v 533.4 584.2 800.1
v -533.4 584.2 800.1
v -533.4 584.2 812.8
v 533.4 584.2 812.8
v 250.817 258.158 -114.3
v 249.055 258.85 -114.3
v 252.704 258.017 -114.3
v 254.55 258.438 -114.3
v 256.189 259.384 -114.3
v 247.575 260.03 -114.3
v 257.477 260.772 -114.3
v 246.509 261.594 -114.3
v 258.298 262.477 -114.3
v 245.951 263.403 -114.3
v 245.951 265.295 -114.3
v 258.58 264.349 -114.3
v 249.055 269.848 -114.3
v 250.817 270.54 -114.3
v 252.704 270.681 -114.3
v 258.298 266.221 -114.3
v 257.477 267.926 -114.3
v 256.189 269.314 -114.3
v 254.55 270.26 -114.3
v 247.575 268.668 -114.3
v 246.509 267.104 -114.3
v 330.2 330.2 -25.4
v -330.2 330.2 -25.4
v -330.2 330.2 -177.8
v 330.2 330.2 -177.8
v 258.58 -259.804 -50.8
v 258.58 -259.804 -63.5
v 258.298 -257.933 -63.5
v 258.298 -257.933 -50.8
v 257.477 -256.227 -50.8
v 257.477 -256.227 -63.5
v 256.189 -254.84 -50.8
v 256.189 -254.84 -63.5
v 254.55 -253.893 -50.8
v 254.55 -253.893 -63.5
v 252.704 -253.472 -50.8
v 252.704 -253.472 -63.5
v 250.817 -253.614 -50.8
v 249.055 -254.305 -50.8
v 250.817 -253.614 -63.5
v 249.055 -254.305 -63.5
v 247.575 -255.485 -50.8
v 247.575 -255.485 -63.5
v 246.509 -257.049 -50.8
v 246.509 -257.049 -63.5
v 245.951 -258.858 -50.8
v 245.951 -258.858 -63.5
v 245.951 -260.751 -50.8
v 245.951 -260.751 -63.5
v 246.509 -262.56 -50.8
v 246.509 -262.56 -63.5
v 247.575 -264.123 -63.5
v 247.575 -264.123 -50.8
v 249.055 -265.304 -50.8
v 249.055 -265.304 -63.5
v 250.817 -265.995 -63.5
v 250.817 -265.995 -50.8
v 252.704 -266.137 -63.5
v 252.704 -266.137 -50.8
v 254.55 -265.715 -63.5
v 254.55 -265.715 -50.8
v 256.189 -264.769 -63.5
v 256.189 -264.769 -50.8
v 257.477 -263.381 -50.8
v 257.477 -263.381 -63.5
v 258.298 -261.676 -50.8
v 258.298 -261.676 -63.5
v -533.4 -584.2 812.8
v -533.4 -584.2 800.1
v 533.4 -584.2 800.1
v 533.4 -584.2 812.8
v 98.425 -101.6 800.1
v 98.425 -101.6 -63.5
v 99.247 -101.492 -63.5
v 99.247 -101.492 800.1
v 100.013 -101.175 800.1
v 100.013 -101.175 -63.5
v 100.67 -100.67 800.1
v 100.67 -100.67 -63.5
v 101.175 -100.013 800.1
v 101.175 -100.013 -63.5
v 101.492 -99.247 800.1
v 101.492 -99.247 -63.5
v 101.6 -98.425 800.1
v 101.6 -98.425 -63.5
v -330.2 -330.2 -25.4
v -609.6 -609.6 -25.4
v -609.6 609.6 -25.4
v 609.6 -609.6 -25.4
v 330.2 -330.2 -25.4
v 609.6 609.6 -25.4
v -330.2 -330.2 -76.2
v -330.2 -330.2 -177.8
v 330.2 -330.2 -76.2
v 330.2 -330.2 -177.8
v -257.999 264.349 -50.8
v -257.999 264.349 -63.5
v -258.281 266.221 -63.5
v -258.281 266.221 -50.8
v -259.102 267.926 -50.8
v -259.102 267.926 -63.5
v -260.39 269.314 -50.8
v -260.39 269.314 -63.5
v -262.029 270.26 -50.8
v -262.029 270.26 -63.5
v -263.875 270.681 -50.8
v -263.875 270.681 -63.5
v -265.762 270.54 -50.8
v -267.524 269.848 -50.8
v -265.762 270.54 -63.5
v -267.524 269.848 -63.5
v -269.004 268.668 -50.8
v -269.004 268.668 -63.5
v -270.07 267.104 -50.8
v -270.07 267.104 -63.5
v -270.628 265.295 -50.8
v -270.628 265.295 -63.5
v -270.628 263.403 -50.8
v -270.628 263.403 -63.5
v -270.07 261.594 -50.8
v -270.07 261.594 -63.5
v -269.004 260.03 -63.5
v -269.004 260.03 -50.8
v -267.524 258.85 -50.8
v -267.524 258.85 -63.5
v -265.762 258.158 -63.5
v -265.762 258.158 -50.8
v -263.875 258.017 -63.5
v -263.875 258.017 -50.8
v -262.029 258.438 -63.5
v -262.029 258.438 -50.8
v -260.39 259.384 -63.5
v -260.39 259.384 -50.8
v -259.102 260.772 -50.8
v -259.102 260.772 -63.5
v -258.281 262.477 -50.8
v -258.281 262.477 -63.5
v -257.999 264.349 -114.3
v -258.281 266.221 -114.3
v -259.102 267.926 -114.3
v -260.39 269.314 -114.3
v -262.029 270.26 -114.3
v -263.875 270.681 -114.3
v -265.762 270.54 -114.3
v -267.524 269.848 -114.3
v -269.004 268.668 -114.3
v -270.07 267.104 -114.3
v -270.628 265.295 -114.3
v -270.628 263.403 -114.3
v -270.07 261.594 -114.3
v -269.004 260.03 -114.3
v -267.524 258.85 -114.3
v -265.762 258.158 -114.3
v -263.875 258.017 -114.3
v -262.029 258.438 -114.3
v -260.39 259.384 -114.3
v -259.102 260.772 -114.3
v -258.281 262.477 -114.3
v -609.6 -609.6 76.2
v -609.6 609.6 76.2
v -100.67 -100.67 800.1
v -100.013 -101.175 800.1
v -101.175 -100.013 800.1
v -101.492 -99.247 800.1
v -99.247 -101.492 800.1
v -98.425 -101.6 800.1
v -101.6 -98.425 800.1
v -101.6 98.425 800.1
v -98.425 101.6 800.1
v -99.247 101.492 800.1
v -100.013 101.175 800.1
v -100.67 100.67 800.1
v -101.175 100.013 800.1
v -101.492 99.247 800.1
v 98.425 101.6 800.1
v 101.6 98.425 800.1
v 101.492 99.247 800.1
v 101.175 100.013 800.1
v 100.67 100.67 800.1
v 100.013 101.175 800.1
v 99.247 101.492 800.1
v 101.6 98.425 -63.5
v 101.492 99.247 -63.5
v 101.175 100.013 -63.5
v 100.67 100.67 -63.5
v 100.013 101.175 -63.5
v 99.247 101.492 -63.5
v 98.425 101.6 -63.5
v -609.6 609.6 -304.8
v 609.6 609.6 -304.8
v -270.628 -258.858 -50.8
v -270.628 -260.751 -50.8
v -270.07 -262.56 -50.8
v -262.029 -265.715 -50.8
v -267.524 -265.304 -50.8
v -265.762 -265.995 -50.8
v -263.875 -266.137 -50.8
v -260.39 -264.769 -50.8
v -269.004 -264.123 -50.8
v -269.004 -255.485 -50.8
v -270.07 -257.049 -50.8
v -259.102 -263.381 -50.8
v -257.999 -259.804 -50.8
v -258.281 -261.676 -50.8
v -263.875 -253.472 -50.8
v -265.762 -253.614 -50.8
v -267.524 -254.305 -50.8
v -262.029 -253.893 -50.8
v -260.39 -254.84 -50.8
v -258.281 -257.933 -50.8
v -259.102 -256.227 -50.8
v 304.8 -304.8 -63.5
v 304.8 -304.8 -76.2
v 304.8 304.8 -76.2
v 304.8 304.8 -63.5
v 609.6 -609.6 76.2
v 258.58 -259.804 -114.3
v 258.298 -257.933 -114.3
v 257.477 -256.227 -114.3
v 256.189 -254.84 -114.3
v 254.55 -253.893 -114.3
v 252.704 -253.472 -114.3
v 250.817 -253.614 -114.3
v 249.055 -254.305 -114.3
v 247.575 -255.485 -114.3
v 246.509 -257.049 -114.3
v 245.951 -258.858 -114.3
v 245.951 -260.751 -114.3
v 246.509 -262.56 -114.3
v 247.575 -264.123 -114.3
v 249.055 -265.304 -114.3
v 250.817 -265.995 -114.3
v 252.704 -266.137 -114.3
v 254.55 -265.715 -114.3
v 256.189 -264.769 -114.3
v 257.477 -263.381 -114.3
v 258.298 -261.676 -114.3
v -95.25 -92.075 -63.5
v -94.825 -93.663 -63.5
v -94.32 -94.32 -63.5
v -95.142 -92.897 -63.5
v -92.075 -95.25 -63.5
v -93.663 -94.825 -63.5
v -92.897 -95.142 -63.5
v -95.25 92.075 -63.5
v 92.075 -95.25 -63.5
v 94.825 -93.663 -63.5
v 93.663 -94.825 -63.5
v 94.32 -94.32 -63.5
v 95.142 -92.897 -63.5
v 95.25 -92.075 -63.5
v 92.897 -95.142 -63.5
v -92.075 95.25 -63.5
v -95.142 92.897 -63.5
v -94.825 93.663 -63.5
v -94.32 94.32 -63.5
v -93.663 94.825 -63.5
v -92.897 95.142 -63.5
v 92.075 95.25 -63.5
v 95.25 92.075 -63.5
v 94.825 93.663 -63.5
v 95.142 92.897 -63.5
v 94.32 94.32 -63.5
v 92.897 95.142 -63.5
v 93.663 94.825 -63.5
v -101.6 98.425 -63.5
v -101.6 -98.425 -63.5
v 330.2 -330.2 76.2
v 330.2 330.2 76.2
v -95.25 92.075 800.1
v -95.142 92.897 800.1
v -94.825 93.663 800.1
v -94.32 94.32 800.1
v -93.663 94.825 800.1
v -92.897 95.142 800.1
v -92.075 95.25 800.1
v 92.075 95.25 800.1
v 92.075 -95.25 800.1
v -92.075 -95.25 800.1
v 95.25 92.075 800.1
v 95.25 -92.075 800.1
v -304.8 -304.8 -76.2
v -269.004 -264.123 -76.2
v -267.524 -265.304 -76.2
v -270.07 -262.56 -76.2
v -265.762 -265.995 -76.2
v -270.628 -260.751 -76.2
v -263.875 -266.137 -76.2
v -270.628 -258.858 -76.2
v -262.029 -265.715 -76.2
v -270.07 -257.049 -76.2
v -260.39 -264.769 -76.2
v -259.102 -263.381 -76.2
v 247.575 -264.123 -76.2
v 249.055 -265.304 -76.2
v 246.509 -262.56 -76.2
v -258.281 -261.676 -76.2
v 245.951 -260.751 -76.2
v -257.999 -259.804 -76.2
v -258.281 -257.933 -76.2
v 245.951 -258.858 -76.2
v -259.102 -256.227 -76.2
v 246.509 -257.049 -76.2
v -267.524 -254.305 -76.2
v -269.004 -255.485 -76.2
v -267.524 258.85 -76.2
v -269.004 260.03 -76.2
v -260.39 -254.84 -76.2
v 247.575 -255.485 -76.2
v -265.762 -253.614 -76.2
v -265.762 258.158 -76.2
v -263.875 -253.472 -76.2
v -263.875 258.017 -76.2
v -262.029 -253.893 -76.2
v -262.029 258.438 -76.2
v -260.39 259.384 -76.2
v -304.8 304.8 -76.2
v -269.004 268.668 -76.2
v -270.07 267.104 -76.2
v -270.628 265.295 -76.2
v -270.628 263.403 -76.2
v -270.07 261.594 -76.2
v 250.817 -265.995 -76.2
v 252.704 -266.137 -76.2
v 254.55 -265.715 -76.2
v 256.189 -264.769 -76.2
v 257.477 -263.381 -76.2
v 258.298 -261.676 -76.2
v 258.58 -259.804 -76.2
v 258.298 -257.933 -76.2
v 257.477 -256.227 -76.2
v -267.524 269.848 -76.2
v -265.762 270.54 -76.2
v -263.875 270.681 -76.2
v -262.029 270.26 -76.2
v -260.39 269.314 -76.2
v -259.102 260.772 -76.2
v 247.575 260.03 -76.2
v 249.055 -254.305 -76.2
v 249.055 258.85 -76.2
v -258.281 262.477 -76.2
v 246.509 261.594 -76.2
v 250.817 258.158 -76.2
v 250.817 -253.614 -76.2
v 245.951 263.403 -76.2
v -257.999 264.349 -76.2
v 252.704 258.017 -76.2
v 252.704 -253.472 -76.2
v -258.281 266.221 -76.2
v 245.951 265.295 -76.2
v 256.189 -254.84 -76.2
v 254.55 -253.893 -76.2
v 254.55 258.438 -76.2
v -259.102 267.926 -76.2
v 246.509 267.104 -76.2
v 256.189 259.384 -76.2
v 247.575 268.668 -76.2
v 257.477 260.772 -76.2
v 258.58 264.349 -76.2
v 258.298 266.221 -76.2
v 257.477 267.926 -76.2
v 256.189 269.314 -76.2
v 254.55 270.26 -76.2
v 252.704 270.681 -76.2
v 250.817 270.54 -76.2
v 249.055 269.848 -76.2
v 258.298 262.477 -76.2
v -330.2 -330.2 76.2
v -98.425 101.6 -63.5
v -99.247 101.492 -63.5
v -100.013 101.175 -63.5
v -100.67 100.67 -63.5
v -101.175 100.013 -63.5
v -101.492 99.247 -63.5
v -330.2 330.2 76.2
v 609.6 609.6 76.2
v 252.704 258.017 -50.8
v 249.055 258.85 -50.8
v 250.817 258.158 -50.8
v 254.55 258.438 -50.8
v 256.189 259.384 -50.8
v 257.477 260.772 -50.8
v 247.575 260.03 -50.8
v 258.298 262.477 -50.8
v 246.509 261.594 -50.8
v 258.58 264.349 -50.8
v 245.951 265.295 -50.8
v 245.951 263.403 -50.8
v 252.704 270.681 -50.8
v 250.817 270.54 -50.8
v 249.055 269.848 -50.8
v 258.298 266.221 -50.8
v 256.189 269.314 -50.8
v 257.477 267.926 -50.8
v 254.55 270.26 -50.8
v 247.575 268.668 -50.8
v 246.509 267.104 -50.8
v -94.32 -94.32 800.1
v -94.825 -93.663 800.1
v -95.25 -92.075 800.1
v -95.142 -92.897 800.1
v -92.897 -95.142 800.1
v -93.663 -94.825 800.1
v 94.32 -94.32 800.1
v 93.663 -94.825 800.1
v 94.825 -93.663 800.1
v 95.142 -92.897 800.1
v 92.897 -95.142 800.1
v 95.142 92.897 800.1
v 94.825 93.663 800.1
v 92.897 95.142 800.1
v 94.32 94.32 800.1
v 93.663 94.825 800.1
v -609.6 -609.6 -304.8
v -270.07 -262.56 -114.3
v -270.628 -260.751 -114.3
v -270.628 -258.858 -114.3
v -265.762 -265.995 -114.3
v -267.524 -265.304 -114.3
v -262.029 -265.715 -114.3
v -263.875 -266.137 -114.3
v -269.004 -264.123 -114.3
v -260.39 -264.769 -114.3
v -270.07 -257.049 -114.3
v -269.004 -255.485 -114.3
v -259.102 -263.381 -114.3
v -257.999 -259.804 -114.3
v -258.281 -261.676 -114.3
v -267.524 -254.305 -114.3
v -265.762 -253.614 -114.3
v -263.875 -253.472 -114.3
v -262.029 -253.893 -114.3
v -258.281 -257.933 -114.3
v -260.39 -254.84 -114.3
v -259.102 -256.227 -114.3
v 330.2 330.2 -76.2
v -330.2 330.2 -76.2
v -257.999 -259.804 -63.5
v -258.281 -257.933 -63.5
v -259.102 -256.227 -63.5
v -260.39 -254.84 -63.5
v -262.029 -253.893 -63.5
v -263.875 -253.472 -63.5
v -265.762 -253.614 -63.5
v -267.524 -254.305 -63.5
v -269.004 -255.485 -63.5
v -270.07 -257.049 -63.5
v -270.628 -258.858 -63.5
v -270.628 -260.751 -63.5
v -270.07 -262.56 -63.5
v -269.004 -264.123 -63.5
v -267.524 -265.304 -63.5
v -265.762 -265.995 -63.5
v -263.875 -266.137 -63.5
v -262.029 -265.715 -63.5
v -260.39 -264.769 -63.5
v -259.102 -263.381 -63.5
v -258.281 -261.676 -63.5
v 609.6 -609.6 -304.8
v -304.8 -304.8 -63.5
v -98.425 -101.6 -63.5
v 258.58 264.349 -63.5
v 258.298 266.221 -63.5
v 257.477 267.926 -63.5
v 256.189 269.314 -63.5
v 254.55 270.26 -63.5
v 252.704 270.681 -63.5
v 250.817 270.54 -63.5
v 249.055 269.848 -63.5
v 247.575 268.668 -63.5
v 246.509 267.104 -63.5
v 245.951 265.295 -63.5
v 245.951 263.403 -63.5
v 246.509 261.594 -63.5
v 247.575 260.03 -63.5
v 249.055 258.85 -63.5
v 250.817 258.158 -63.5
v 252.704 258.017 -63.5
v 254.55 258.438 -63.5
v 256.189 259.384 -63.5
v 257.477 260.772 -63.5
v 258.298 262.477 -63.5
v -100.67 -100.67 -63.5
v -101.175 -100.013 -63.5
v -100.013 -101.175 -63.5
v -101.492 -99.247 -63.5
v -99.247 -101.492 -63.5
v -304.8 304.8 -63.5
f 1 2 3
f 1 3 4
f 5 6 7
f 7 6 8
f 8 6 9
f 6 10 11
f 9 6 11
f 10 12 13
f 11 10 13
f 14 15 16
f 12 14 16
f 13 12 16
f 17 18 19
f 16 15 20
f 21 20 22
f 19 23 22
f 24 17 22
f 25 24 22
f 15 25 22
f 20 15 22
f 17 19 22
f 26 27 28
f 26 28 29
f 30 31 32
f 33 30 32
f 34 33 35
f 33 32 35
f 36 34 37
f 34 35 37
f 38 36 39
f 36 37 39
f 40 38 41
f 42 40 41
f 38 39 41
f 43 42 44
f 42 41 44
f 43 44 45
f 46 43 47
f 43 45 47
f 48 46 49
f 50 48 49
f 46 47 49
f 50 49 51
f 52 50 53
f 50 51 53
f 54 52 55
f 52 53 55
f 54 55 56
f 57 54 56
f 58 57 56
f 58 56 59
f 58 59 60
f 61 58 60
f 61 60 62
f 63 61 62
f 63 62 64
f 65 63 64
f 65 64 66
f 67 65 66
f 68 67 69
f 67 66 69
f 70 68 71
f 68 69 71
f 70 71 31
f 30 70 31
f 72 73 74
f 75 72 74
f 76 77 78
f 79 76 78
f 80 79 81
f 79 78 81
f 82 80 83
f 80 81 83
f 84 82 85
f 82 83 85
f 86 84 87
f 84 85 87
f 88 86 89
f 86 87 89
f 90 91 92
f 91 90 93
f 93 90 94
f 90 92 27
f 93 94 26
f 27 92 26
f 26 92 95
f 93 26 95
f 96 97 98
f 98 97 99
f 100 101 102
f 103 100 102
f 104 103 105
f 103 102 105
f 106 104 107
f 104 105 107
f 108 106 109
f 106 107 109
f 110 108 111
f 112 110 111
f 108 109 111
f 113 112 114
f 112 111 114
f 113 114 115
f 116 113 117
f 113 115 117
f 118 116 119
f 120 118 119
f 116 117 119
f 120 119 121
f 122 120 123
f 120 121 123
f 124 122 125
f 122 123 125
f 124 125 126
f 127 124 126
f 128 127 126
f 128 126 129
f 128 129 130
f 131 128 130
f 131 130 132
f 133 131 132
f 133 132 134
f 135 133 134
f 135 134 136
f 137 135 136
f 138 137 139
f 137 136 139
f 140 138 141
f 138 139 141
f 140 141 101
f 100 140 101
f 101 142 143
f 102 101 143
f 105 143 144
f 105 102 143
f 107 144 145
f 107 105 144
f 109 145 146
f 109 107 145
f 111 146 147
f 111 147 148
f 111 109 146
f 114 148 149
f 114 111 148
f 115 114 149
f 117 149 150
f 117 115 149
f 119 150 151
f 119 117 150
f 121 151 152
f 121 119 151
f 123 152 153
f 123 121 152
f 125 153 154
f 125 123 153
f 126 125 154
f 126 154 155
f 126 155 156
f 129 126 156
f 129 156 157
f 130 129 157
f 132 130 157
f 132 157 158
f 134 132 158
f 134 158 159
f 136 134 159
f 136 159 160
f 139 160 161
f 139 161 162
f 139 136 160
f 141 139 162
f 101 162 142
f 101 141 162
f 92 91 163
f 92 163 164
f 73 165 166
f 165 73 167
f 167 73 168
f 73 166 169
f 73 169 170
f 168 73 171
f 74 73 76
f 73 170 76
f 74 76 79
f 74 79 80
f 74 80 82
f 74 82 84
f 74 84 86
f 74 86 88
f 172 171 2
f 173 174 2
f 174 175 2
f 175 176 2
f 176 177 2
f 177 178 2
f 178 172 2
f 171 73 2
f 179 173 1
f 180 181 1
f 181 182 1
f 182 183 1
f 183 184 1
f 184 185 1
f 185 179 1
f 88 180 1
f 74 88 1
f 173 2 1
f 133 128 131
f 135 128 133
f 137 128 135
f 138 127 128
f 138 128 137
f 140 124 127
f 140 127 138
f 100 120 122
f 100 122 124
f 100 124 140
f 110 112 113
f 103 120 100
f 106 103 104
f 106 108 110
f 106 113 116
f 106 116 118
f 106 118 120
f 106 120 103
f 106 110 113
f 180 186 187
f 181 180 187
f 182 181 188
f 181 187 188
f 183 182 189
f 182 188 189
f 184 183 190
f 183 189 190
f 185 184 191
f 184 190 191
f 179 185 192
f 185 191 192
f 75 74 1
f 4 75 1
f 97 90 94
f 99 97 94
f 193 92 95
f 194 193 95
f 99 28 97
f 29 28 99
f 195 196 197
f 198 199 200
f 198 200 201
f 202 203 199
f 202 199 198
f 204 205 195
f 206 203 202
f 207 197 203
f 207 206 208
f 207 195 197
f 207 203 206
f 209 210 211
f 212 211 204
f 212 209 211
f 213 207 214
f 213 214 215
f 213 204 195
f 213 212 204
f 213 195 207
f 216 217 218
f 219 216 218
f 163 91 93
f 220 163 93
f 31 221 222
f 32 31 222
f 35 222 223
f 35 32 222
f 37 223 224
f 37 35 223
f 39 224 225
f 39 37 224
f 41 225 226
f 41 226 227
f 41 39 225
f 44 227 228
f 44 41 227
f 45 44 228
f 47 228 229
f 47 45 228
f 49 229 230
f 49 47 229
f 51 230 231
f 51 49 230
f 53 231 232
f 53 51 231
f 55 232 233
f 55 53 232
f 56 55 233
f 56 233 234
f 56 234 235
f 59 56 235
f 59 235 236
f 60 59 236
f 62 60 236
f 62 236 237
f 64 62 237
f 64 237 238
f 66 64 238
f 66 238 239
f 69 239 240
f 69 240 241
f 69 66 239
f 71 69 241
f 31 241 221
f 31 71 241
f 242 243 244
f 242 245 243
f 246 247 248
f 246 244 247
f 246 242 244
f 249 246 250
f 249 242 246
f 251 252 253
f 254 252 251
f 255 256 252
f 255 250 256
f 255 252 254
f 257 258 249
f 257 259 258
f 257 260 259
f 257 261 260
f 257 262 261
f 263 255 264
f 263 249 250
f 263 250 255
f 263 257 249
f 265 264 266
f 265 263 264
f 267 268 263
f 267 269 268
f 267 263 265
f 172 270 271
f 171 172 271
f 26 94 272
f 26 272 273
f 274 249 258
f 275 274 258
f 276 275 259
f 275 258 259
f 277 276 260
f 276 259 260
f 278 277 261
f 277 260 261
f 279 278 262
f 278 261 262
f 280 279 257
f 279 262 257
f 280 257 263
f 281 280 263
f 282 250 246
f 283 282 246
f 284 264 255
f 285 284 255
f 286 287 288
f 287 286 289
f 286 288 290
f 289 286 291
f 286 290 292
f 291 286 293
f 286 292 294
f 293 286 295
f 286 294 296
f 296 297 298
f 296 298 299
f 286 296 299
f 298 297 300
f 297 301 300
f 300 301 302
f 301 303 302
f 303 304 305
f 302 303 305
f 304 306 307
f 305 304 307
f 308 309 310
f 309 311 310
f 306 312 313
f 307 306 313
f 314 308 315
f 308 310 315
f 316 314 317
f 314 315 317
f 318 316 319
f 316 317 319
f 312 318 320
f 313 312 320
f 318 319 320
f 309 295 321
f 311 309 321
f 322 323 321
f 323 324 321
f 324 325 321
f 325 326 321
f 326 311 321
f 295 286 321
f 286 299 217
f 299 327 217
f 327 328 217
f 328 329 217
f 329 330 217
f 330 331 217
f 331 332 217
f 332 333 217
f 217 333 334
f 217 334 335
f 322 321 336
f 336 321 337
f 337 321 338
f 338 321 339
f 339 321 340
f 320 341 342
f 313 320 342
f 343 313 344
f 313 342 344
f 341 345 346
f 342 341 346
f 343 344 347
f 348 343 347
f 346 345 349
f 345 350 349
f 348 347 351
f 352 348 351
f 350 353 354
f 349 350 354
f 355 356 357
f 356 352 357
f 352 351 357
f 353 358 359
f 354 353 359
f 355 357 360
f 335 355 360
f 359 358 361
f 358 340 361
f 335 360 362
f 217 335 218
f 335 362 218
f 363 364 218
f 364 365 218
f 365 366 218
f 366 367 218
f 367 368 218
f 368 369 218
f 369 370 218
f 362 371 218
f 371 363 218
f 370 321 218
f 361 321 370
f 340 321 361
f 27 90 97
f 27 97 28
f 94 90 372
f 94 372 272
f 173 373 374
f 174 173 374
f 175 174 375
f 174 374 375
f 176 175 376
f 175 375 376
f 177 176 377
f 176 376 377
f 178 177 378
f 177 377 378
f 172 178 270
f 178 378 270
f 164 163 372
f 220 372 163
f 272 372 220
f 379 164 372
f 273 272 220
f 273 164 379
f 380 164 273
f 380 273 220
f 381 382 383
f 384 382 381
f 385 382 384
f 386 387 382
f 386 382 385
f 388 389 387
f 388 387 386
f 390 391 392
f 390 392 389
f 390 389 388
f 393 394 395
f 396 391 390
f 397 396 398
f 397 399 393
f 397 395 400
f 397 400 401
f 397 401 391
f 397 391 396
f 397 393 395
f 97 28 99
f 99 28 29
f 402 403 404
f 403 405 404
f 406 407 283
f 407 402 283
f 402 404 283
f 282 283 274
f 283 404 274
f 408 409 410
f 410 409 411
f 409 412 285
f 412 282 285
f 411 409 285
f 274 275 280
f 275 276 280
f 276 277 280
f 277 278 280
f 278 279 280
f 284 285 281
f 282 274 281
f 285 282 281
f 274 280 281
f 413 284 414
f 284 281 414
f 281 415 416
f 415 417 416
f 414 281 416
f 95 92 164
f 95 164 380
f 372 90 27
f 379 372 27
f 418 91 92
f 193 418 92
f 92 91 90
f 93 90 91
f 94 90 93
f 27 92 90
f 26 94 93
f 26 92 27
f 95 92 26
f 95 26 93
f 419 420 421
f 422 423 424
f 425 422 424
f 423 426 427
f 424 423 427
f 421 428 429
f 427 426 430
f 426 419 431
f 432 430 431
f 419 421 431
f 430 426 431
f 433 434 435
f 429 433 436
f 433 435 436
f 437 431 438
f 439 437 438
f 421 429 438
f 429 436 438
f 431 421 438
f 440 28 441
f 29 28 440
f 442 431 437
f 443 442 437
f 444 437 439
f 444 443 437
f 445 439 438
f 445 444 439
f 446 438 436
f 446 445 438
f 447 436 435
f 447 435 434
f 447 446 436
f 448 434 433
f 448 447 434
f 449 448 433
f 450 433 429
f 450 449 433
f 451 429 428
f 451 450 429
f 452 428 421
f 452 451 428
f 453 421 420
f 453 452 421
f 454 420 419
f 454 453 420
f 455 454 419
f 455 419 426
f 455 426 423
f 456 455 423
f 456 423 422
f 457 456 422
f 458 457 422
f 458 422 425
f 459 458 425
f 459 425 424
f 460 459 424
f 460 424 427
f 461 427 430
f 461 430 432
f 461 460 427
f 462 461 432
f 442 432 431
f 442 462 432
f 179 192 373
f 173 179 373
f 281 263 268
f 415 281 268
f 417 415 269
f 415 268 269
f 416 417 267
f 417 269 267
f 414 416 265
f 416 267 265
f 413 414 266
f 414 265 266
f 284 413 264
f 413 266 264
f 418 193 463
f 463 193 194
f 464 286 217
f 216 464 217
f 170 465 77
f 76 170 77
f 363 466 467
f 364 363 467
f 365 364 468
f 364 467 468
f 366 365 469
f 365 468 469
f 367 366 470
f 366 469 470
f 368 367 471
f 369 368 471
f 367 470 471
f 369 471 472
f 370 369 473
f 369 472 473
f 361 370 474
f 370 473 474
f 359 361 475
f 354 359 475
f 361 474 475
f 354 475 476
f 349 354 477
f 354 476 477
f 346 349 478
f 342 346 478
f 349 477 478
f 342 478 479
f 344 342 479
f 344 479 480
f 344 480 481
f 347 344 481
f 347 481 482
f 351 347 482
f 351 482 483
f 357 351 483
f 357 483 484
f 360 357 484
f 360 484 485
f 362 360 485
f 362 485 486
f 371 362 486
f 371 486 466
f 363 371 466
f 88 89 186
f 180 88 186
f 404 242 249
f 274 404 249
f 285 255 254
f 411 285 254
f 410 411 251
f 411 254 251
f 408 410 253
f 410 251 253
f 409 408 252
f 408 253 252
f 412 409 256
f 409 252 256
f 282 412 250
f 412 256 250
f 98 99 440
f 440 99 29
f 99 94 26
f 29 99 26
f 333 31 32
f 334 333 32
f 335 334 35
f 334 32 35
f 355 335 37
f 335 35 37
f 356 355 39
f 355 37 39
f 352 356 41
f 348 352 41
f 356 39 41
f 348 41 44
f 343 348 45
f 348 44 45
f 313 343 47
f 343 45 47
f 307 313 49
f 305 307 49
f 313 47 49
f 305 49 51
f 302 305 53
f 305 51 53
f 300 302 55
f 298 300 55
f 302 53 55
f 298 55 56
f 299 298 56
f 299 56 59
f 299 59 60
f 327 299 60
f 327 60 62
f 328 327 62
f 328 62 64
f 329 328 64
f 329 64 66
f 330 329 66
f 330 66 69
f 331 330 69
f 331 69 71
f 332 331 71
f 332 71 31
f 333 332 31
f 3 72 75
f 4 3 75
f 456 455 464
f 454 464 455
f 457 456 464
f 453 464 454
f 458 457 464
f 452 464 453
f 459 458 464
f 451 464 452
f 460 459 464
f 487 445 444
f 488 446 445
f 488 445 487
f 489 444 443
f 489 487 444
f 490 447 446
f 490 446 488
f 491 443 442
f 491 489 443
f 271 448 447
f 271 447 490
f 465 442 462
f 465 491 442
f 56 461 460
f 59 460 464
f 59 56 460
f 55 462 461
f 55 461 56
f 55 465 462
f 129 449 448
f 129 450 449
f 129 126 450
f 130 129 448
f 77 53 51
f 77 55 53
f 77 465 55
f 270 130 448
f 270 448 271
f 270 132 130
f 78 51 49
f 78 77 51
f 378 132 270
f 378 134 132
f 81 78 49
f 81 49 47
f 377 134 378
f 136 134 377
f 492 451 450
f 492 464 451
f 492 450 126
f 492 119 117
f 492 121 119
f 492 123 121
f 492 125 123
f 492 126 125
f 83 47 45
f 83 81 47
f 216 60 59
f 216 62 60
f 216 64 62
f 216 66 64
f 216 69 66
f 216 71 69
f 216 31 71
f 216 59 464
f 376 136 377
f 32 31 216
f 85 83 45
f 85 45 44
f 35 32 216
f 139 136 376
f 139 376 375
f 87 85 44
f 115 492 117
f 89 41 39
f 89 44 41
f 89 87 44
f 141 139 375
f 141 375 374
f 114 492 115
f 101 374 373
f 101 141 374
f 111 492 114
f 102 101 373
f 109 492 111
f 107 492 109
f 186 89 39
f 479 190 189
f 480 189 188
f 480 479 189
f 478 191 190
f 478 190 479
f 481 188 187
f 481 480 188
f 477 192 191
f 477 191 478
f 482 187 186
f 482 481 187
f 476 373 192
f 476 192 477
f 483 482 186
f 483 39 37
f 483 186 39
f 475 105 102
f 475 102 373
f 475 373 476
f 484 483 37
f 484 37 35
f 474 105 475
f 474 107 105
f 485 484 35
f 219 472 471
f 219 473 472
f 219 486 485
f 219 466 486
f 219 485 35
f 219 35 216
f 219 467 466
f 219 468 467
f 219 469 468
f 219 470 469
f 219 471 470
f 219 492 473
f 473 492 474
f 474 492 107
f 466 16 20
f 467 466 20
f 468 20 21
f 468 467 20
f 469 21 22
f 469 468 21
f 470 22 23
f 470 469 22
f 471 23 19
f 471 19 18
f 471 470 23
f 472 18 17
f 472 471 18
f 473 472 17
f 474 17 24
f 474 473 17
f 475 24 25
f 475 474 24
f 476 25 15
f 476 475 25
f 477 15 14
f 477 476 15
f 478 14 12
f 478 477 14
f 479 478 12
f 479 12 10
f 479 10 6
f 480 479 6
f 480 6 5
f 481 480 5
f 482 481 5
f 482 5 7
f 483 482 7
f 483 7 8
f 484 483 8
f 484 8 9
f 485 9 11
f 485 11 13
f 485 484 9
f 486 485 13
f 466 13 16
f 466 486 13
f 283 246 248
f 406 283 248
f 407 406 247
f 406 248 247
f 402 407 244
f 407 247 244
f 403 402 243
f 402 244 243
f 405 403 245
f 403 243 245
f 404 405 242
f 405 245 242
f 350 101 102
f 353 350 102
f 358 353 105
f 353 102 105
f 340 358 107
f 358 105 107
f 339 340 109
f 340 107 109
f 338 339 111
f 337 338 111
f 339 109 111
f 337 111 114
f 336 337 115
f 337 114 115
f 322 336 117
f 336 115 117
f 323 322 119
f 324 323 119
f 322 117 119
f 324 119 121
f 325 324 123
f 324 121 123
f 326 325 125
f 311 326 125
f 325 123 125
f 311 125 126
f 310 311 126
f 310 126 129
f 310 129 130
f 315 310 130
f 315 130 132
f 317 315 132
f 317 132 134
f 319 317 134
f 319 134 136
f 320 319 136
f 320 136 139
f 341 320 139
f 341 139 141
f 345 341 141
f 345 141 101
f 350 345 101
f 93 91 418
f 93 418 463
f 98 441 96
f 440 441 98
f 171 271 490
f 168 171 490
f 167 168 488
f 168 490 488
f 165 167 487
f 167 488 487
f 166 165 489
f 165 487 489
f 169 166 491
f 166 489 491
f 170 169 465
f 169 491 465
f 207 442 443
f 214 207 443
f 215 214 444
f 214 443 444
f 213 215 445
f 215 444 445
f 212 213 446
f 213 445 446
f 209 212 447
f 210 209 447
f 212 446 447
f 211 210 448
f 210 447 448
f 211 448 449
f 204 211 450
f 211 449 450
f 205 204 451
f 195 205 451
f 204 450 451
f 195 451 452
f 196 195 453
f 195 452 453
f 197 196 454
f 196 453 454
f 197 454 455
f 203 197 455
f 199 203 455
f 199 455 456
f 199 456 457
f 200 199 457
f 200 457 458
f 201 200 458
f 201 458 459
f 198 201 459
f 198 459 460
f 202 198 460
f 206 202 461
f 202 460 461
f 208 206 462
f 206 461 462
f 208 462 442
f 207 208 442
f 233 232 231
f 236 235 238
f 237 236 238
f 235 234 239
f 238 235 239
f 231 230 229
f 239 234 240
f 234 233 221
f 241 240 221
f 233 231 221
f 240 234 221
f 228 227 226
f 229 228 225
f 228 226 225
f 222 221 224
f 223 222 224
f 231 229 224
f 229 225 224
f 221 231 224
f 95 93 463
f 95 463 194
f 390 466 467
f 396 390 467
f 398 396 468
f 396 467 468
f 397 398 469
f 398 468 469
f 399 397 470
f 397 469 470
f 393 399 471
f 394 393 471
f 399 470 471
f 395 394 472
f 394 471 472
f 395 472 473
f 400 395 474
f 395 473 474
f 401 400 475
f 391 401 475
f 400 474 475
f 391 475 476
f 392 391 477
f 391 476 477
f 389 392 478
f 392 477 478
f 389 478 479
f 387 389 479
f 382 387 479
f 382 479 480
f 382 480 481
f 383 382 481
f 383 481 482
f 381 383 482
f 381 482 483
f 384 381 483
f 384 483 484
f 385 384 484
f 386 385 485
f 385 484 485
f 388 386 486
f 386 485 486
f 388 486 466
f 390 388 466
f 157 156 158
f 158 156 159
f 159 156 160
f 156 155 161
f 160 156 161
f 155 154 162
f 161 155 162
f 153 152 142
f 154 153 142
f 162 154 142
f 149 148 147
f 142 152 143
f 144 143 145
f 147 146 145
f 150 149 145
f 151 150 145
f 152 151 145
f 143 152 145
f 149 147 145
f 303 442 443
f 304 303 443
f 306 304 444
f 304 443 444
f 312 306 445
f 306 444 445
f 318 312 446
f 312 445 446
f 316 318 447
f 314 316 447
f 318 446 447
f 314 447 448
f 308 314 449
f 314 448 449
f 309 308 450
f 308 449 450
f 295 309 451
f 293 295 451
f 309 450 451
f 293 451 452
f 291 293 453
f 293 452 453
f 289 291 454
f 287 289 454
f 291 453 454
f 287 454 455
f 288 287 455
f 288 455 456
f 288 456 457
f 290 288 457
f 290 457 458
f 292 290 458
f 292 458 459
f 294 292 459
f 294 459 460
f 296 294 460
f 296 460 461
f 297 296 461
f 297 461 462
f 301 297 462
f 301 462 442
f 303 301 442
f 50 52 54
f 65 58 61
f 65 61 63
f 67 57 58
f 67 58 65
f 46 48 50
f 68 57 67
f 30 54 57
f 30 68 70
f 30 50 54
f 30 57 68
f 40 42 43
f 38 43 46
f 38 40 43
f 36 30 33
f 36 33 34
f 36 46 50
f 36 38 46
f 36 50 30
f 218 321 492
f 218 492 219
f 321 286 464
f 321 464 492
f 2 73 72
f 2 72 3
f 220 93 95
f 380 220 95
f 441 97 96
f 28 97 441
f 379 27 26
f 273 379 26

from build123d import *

# Parameters (mm, degrees)
F0_W           = 1219.2
F0_H           = 1219.2
F1_DEPTH       = 304.8
F2_DEPTH       = 25.4
F3_W           = 660.4
F3_H           = 660.4
F4_DEPTH       = 152.4
F5_W           = 660.4
F5_H           = 660.4
F6_DEPTH       = 101.6
F7_W           = 1219.2
F7_H           = 1219.2
F7_W_2         = 660.4
F7_H_2         = 660.4
F8_DEPTH       = 101.6
F9_W           = 609.6
F9_H           = 609.6
F10_DEPTH      = 12.7
F12_DEPTH      = 863.6
F13_W          = 1066.8
F13_H          = 1168.4
F14_DEPTH      = 12.7
F15_R          = 6.35
F16_DEPTH      = 76.2
F17_R          = 6.35
F18_DEPTH      = 50.8
F18_DEPTH_BACK = 12.7


with BuildPart() as f1:
    # F0 (on Top) → F1 (new body)
    with BuildSketch(Plane.XY):
        Rectangle(F0_W, F0_H)
    extrude(amount=-F1_DEPTH)

    # F2 (cut): a face of the model
    f2_faces = [f1.faces().sort_by_distance(p)[0] for p in [
        (0, 0, 0),
    ]]
    extrude(f2_faces, amount=-F2_DEPTH, mode=Mode.SUBTRACT)

    # F3 (on face) → F4 (cut)
    with BuildSketch(Plane.XY.offset(-25.4)):
        Rectangle(F3_W, F3_H)
    extrude(amount=-F4_DEPTH, mode=Mode.SUBTRACT)


with BuildPart() as f6:
    # F5 (on face) → F6 (new body)
    with BuildSketch(Plane.XY.offset(-177.8)):
        Rectangle(F5_W, F5_H)
    extrude(amount=F6_DEPTH)


with BuildPart() as f8:
    # F7 (on face) → F8 (new body)
    with BuildSketch(Plane.XY.offset(-25.4)):
        Rectangle(F7_W, F7_H)
        Rectangle(F7_W_2, F7_H_2, mode=Mode.SUBTRACT)
    extrude(amount=F8_DEPTH)


with BuildPart() as f10:
    # F9 (on face) → F10 (new body)
    with BuildSketch(Plane.XY.offset(-76.2)):
        Rectangle(F9_W, F9_H)
    extrude(amount=F10_DEPTH)

    # F11 (on face) → F12 (join)
    with BuildSketch(Plane.XY.offset(-63.5)):
        with BuildLine():
            ThreePointArc((-101.6, -98.425), (-100.6700640303, -100.6700640303), (-98.425, -101.6))
            Line((-98.425, -101.6), (98.425, -101.6))
            ThreePointArc((98.425, -101.6), (100.6700640303, -100.6700640303), (101.6, -98.425))
            Line((101.6, -98.425), (101.6, 98.425))
            ThreePointArc((101.6, 98.425), (100.6700640303, 100.6700640303), (98.425, 101.6))
            Line((98.425, 101.6), (-98.425, 101.6))
            ThreePointArc((-98.425, 101.6), (-100.6700640303, 100.6700640303), (-101.6, 98.425))
            Line((-101.6, 98.425), (-101.6, -98.425))
        make_face()
        with BuildLine():
            ThreePointArc((-95.25, 92.075), (-94.3200640303, 94.3200640303), (-92.075, 95.25))
            Line((-92.075, 95.25), (92.075, 95.25))
            ThreePointArc((92.075, 95.25), (94.3200640303, 94.3200640303), (95.25, 92.075))
            Line((95.25, 92.075), (95.25, -92.075))
            ThreePointArc((95.25, -92.075), (94.3200640303, -94.3200640303), (92.075, -95.25))
            Line((92.075, -95.25), (-92.075, -95.25))
            ThreePointArc((-92.075, -95.25), (-94.3200640303, -94.3200640303), (-95.25, -92.075))
            Line((-95.25, -92.075), (-95.25, 92.075))
        make_face(mode=Mode.SUBTRACT)
    extrude(amount=F12_DEPTH)

    # F13 (on face) → F14 (join)
    with BuildSketch(Plane.XY.offset(800.1)):
        Rectangle(F13_W, F13_H)
    extrude(amount=F14_DEPTH)

    # F15 (on face) → F16 (cut)
    with BuildSketch(Plane.XY.offset(-63.5)):
        with Locations((-264.3490433693, 264.3490433693)):
            Circle(F15_R)
        with Locations((252.229899168, 264.3490433693)):
            Circle(F15_R)
        with Locations((252.229899168, -259.8043680191)):
            Circle(F15_R)
        with Locations((-264.3490433693, -259.8043680191)):
            Circle(F15_R)
    extrude(amount=-F16_DEPTH, mode=Mode.SUBTRACT)


with BuildPart() as f18:
    # F17 (on face) → F18 (new body, two sides)
    with BuildSketch(Plane.XY.offset(-63.5)) as f18_sk:
        with Locations((-264.3490433693, 264.3490433693)):
            Circle(F17_R)
    extrude(amount=-F18_DEPTH)
    extrude(f18_sk.sketch, amount=F18_DEPTH_BACK)


with BuildPart() as f18b:
    # F17 (on face) → F18, piece 2 (new body, two sides)
    with BuildSketch(Plane.XY.offset(-63.5)) as f18_2_sk:
        with Locations((252.229899168, 264.3490433693)):
            Circle(F17_R)
    extrude(amount=-F18_DEPTH)
    extrude(f18_2_sk.sketch, amount=F18_DEPTH_BACK)


with BuildPart() as f18c:
    # F17 (on face) → F18, piece 3 (new body, two sides)
    with BuildSketch(Plane.XY.offset(-63.5)) as f18_3_sk:
        with Locations((252.229899168, -259.8043680191)):
            Circle(F17_R)
    extrude(amount=-F18_DEPTH)
    extrude(f18_3_sk.sketch, amount=F18_DEPTH_BACK)


with BuildPart() as f18d:
    # F17 (on face) → F18, piece 4 (new body, two sides)
    with BuildSketch(Plane.XY.offset(-63.5)) as f18_4_sk:
        with Locations((-264.3490433693, -259.8043680191)):
            Circle(F17_R)
    extrude(amount=-F18_DEPTH)
    extrude(f18_4_sk.sketch, amount=F18_DEPTH_BACK)


solid = Compound([f1.part, f6.part, f8.part, f10.part, f18.part, f18b.part, f18c.part, f18d.part])
